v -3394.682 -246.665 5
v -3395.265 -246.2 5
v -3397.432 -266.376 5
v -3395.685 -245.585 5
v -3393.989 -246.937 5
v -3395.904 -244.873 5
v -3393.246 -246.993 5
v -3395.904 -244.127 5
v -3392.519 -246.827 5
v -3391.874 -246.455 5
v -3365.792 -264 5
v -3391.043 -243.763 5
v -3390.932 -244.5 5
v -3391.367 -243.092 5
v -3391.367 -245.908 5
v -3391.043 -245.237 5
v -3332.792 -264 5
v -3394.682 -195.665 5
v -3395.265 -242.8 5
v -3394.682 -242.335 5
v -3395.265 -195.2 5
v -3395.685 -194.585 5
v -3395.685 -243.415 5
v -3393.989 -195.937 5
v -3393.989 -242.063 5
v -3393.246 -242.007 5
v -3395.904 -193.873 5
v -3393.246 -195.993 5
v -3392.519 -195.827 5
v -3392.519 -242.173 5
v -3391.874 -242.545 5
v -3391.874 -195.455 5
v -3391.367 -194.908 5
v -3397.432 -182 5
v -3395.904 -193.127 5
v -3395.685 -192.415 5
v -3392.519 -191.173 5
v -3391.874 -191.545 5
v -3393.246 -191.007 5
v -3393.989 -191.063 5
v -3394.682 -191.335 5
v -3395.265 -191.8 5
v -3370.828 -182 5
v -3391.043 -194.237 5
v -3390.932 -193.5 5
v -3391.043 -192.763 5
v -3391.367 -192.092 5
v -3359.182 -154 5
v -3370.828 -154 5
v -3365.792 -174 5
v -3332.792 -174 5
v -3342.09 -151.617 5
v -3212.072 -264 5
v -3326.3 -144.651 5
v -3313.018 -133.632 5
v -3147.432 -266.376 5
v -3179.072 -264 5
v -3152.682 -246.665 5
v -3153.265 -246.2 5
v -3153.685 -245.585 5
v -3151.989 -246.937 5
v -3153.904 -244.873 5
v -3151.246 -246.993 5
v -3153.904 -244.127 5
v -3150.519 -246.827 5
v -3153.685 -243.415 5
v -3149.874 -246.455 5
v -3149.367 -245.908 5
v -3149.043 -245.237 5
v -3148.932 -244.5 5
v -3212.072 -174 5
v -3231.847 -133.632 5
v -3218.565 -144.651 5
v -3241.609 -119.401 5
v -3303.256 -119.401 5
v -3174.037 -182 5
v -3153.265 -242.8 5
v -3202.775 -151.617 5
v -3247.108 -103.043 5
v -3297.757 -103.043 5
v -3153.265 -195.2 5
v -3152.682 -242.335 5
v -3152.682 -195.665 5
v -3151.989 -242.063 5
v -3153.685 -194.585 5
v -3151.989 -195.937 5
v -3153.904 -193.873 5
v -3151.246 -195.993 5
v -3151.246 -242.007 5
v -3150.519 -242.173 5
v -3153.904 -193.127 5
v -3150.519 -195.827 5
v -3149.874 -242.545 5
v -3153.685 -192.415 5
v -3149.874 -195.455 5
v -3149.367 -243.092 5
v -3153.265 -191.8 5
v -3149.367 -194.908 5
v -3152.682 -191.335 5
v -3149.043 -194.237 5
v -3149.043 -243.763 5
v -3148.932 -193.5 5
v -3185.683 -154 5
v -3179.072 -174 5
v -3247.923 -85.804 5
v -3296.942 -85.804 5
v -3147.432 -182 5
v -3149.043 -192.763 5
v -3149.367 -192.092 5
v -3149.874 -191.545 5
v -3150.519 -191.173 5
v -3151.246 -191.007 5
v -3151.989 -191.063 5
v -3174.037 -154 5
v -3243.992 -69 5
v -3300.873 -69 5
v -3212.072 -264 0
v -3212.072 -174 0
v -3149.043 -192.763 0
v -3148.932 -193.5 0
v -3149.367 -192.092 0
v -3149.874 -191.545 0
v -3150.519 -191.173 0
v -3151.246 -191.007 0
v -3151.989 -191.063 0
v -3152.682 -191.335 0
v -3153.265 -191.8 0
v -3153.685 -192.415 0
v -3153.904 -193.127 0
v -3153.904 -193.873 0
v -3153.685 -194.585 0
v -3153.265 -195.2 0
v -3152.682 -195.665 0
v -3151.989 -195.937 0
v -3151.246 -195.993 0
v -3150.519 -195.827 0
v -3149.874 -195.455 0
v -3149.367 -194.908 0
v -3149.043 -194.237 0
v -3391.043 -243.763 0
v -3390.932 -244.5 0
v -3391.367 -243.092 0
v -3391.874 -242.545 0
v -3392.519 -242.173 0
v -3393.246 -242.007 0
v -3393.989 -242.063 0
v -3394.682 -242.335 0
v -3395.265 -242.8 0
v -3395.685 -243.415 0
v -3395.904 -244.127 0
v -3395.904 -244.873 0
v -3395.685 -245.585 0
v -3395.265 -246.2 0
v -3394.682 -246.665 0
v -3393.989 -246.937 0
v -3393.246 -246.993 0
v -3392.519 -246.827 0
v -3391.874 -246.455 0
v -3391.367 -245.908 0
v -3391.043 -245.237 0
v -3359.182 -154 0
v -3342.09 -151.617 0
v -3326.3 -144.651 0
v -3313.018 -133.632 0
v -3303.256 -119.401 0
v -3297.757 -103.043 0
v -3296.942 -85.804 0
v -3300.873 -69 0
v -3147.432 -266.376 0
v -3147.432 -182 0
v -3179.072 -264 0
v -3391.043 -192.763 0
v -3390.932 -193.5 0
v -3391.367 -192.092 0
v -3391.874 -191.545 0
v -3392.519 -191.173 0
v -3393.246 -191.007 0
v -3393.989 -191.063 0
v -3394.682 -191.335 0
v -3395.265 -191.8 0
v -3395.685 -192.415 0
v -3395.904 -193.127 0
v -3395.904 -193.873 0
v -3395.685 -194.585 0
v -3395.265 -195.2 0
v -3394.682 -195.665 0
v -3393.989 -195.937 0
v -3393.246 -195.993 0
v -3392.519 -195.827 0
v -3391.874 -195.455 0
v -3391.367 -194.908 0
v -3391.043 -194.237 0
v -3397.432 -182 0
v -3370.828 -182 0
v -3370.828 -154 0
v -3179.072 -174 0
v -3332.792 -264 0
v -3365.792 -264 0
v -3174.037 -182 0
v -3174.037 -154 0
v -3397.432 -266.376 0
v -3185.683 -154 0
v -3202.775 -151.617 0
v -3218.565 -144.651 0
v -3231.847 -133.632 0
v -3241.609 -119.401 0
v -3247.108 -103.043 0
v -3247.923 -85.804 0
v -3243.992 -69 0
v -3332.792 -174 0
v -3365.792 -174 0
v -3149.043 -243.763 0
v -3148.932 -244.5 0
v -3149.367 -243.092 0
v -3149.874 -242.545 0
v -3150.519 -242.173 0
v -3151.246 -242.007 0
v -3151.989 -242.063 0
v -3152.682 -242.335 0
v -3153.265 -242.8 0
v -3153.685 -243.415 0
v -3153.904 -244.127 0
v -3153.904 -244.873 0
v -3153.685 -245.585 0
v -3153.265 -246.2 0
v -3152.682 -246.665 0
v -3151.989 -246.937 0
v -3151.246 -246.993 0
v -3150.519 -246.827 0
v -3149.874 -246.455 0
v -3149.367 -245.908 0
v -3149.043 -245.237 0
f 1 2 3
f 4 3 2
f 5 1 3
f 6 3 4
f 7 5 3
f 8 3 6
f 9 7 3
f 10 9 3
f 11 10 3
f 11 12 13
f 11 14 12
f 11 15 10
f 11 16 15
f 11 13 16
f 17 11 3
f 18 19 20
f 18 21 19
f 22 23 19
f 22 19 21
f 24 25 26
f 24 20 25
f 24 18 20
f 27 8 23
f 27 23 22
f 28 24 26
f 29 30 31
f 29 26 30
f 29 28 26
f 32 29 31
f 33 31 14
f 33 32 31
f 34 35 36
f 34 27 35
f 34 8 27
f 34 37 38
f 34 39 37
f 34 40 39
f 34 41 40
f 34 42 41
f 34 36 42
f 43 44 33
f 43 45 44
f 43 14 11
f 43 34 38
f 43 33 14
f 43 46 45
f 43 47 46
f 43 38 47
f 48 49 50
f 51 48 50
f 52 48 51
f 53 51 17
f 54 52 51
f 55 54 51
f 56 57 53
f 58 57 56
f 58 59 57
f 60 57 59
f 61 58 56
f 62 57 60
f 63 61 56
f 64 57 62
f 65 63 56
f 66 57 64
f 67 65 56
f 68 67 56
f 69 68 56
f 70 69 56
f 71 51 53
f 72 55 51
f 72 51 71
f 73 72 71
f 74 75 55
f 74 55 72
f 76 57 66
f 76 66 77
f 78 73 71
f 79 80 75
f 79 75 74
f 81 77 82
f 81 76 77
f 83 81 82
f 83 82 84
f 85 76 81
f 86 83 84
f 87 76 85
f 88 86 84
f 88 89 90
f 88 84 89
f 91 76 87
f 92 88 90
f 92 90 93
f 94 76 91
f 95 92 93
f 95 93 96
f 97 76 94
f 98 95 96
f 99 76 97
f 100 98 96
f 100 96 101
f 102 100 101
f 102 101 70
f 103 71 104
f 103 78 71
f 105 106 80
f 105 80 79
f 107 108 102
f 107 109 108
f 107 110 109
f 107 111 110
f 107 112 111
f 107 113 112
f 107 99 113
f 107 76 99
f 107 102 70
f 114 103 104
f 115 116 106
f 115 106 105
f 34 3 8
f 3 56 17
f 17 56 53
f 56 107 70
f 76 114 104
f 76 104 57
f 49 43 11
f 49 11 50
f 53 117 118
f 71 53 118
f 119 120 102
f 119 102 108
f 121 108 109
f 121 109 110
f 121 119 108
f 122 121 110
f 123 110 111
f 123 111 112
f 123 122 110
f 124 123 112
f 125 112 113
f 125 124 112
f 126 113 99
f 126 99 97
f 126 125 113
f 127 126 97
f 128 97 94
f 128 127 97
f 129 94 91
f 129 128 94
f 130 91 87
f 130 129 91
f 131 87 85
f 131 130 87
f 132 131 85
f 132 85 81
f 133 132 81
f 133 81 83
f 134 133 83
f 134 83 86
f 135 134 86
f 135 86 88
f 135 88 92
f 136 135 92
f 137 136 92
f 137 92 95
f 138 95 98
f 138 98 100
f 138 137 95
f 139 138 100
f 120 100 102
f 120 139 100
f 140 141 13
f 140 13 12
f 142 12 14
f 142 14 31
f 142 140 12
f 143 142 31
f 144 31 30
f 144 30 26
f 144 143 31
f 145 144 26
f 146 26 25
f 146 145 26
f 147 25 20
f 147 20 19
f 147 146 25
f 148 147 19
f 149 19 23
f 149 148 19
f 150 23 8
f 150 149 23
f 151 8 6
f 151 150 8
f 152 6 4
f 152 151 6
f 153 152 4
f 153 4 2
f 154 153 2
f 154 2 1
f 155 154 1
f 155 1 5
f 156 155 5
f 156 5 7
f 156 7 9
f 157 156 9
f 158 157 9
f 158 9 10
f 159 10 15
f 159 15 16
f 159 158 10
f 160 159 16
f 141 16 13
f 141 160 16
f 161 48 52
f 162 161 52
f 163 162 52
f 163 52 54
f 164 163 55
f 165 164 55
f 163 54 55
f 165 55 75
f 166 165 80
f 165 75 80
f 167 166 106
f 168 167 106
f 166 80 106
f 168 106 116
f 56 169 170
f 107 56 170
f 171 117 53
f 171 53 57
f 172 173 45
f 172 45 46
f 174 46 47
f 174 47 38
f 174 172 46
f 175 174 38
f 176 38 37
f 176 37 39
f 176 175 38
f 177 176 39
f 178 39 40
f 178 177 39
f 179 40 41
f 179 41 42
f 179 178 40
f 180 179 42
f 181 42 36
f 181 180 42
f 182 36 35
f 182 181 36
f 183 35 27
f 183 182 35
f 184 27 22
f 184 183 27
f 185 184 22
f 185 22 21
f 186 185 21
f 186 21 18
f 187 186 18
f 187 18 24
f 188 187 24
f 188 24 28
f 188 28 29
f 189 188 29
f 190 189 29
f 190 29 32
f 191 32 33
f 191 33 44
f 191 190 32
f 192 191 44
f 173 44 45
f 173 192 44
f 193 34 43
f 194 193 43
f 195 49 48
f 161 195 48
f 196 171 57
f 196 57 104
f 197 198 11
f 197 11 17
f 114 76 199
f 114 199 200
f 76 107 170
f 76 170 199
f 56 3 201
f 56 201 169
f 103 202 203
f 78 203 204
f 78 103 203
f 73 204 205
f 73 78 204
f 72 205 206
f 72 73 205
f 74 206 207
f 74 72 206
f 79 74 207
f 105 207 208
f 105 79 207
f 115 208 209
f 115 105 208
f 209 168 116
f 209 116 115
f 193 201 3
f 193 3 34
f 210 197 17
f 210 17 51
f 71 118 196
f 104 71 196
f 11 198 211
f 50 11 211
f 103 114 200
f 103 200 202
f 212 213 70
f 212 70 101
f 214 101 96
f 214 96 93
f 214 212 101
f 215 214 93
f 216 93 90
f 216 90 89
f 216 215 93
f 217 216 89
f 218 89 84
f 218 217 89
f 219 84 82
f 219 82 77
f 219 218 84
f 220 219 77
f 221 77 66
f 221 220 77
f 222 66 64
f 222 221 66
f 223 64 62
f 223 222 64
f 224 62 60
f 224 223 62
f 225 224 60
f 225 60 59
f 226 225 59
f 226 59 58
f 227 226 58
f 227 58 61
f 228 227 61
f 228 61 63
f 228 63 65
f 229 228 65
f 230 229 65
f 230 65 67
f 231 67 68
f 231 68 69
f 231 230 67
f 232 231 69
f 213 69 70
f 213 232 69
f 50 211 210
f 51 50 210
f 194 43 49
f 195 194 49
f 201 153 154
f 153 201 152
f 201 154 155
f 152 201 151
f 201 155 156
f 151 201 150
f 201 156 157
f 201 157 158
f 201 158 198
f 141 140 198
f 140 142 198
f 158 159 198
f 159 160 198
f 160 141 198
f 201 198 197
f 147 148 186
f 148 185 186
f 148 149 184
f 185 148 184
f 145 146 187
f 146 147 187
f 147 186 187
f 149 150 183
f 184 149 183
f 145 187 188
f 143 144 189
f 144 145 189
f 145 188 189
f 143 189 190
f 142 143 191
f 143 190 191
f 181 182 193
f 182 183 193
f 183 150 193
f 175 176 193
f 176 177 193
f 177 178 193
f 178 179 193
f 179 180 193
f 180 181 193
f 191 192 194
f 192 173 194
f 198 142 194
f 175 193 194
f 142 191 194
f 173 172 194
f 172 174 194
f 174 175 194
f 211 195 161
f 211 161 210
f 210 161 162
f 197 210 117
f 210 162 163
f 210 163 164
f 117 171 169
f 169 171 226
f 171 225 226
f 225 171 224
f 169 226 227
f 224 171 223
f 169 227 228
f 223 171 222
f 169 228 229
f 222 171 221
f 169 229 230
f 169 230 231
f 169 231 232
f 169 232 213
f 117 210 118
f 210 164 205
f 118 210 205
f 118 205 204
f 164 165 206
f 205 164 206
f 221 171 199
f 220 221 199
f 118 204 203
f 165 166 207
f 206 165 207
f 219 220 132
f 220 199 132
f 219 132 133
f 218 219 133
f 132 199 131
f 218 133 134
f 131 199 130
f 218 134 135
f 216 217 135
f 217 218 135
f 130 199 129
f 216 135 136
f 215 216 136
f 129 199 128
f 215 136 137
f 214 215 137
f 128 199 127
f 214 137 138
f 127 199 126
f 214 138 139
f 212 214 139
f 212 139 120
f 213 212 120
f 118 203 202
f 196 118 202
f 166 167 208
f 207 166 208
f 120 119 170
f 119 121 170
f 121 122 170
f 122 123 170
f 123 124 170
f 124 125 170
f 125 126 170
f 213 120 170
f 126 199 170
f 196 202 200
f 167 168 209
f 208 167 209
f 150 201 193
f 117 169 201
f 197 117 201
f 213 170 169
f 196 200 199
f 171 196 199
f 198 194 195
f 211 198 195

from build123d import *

# Parameters (mm, degrees)
SKETCH1_W           = 250
SKETCH1_H           = 267.4
SKETCH1_R           = 2.5
SKETCH1_W_2         = 33
SKETCH1_H_2         = 90
BOSS_EXTRUDE1_DEPTH = 5
SKETCH6_W           = 250
SKETCH6_H           = 70.024397165
CUT_EXTRUDE4_DEPTH  = 6


with BuildPart() as part:
    # Sketch1 → Boss-Extrude1 (new body)
    with BuildSketch(Plane.XY):
        with Locations((-3272.432417868, -202.7)):
            Rectangle(SKETCH1_W, SKETCH1_H)
        with Locations((-3151.432417868, -193.5)):
            Circle(SKETCH1_R, mode=Mode.SUBTRACT)
        with Locations((-3151.432417868, -244.5)):
            Circle(SKETCH1_R, mode=Mode.SUBTRACT)
        with Locations((-3393.432417868, -244.5)):
            Circle(SKETCH1_R, mode=Mode.SUBTRACT)
        with Locations((-3393.432417868, -193.5)):
            Circle(SKETCH1_R, mode=Mode.SUBTRACT)
        with Locations((-3195.572417868, -219)):
            Rectangle(SKETCH1_W_2, SKETCH1_H_2, mode=Mode.SUBTRACT)
        with Locations((-3349.292417868, -219)):
            Rectangle(SKETCH1_W_2, SKETCH1_H_2, mode=Mode.SUBTRACT)
    extrude(amount=BOSS_EXTRUDE1_DEPTH)

    # Sketch6 → Cut-Extrude4 (cut, through all)
    with BuildSketch(Plane.XY.offset(5)):
        with BuildLine():
            Line((-3243.992329325, -69), (-3147.432417868, -69))
            Line((-3147.432417868, -69), (-3147.432417868, -182))
            Line((-3147.432417868, -182), (-3174.036756226, -182))
            Line((-3174.036756226, -182), (-3174.036756226, -154))
            Line((-3174.036756226, -154), (-3185.682810376, -154))
            ThreePointArc((-3185.682810376, -154), (-3237.221630697, -126.855339059), (-3243.992329325, -69))
        make_face()
        with Locations((-3272.432417868, -301.387801417)):
            Rectangle(SKETCH6_W, SKETCH6_H)
        with BuildLine():
            Line((-3300.872506412, -69), (-3397.432417868, -69))
            Line((-3397.432417868, -69), (-3397.432417868, -182))
            Line((-3397.432417868, -182), (-3370.82807951, -182))
            Line((-3370.82807951, -182), (-3370.82807951, -154))
            Line((-3370.82807951, -154), (-3359.18202536, -154))
            ThreePointArc((-3359.18202536, -154), (-3307.64320504, -126.855339059), (-3300.872506412, -69))
        make_face()
    extrude(amount=-CUT_EXTRUDE4_DEPTH, mode=Mode.SUBTRACT)


solid = part.part
